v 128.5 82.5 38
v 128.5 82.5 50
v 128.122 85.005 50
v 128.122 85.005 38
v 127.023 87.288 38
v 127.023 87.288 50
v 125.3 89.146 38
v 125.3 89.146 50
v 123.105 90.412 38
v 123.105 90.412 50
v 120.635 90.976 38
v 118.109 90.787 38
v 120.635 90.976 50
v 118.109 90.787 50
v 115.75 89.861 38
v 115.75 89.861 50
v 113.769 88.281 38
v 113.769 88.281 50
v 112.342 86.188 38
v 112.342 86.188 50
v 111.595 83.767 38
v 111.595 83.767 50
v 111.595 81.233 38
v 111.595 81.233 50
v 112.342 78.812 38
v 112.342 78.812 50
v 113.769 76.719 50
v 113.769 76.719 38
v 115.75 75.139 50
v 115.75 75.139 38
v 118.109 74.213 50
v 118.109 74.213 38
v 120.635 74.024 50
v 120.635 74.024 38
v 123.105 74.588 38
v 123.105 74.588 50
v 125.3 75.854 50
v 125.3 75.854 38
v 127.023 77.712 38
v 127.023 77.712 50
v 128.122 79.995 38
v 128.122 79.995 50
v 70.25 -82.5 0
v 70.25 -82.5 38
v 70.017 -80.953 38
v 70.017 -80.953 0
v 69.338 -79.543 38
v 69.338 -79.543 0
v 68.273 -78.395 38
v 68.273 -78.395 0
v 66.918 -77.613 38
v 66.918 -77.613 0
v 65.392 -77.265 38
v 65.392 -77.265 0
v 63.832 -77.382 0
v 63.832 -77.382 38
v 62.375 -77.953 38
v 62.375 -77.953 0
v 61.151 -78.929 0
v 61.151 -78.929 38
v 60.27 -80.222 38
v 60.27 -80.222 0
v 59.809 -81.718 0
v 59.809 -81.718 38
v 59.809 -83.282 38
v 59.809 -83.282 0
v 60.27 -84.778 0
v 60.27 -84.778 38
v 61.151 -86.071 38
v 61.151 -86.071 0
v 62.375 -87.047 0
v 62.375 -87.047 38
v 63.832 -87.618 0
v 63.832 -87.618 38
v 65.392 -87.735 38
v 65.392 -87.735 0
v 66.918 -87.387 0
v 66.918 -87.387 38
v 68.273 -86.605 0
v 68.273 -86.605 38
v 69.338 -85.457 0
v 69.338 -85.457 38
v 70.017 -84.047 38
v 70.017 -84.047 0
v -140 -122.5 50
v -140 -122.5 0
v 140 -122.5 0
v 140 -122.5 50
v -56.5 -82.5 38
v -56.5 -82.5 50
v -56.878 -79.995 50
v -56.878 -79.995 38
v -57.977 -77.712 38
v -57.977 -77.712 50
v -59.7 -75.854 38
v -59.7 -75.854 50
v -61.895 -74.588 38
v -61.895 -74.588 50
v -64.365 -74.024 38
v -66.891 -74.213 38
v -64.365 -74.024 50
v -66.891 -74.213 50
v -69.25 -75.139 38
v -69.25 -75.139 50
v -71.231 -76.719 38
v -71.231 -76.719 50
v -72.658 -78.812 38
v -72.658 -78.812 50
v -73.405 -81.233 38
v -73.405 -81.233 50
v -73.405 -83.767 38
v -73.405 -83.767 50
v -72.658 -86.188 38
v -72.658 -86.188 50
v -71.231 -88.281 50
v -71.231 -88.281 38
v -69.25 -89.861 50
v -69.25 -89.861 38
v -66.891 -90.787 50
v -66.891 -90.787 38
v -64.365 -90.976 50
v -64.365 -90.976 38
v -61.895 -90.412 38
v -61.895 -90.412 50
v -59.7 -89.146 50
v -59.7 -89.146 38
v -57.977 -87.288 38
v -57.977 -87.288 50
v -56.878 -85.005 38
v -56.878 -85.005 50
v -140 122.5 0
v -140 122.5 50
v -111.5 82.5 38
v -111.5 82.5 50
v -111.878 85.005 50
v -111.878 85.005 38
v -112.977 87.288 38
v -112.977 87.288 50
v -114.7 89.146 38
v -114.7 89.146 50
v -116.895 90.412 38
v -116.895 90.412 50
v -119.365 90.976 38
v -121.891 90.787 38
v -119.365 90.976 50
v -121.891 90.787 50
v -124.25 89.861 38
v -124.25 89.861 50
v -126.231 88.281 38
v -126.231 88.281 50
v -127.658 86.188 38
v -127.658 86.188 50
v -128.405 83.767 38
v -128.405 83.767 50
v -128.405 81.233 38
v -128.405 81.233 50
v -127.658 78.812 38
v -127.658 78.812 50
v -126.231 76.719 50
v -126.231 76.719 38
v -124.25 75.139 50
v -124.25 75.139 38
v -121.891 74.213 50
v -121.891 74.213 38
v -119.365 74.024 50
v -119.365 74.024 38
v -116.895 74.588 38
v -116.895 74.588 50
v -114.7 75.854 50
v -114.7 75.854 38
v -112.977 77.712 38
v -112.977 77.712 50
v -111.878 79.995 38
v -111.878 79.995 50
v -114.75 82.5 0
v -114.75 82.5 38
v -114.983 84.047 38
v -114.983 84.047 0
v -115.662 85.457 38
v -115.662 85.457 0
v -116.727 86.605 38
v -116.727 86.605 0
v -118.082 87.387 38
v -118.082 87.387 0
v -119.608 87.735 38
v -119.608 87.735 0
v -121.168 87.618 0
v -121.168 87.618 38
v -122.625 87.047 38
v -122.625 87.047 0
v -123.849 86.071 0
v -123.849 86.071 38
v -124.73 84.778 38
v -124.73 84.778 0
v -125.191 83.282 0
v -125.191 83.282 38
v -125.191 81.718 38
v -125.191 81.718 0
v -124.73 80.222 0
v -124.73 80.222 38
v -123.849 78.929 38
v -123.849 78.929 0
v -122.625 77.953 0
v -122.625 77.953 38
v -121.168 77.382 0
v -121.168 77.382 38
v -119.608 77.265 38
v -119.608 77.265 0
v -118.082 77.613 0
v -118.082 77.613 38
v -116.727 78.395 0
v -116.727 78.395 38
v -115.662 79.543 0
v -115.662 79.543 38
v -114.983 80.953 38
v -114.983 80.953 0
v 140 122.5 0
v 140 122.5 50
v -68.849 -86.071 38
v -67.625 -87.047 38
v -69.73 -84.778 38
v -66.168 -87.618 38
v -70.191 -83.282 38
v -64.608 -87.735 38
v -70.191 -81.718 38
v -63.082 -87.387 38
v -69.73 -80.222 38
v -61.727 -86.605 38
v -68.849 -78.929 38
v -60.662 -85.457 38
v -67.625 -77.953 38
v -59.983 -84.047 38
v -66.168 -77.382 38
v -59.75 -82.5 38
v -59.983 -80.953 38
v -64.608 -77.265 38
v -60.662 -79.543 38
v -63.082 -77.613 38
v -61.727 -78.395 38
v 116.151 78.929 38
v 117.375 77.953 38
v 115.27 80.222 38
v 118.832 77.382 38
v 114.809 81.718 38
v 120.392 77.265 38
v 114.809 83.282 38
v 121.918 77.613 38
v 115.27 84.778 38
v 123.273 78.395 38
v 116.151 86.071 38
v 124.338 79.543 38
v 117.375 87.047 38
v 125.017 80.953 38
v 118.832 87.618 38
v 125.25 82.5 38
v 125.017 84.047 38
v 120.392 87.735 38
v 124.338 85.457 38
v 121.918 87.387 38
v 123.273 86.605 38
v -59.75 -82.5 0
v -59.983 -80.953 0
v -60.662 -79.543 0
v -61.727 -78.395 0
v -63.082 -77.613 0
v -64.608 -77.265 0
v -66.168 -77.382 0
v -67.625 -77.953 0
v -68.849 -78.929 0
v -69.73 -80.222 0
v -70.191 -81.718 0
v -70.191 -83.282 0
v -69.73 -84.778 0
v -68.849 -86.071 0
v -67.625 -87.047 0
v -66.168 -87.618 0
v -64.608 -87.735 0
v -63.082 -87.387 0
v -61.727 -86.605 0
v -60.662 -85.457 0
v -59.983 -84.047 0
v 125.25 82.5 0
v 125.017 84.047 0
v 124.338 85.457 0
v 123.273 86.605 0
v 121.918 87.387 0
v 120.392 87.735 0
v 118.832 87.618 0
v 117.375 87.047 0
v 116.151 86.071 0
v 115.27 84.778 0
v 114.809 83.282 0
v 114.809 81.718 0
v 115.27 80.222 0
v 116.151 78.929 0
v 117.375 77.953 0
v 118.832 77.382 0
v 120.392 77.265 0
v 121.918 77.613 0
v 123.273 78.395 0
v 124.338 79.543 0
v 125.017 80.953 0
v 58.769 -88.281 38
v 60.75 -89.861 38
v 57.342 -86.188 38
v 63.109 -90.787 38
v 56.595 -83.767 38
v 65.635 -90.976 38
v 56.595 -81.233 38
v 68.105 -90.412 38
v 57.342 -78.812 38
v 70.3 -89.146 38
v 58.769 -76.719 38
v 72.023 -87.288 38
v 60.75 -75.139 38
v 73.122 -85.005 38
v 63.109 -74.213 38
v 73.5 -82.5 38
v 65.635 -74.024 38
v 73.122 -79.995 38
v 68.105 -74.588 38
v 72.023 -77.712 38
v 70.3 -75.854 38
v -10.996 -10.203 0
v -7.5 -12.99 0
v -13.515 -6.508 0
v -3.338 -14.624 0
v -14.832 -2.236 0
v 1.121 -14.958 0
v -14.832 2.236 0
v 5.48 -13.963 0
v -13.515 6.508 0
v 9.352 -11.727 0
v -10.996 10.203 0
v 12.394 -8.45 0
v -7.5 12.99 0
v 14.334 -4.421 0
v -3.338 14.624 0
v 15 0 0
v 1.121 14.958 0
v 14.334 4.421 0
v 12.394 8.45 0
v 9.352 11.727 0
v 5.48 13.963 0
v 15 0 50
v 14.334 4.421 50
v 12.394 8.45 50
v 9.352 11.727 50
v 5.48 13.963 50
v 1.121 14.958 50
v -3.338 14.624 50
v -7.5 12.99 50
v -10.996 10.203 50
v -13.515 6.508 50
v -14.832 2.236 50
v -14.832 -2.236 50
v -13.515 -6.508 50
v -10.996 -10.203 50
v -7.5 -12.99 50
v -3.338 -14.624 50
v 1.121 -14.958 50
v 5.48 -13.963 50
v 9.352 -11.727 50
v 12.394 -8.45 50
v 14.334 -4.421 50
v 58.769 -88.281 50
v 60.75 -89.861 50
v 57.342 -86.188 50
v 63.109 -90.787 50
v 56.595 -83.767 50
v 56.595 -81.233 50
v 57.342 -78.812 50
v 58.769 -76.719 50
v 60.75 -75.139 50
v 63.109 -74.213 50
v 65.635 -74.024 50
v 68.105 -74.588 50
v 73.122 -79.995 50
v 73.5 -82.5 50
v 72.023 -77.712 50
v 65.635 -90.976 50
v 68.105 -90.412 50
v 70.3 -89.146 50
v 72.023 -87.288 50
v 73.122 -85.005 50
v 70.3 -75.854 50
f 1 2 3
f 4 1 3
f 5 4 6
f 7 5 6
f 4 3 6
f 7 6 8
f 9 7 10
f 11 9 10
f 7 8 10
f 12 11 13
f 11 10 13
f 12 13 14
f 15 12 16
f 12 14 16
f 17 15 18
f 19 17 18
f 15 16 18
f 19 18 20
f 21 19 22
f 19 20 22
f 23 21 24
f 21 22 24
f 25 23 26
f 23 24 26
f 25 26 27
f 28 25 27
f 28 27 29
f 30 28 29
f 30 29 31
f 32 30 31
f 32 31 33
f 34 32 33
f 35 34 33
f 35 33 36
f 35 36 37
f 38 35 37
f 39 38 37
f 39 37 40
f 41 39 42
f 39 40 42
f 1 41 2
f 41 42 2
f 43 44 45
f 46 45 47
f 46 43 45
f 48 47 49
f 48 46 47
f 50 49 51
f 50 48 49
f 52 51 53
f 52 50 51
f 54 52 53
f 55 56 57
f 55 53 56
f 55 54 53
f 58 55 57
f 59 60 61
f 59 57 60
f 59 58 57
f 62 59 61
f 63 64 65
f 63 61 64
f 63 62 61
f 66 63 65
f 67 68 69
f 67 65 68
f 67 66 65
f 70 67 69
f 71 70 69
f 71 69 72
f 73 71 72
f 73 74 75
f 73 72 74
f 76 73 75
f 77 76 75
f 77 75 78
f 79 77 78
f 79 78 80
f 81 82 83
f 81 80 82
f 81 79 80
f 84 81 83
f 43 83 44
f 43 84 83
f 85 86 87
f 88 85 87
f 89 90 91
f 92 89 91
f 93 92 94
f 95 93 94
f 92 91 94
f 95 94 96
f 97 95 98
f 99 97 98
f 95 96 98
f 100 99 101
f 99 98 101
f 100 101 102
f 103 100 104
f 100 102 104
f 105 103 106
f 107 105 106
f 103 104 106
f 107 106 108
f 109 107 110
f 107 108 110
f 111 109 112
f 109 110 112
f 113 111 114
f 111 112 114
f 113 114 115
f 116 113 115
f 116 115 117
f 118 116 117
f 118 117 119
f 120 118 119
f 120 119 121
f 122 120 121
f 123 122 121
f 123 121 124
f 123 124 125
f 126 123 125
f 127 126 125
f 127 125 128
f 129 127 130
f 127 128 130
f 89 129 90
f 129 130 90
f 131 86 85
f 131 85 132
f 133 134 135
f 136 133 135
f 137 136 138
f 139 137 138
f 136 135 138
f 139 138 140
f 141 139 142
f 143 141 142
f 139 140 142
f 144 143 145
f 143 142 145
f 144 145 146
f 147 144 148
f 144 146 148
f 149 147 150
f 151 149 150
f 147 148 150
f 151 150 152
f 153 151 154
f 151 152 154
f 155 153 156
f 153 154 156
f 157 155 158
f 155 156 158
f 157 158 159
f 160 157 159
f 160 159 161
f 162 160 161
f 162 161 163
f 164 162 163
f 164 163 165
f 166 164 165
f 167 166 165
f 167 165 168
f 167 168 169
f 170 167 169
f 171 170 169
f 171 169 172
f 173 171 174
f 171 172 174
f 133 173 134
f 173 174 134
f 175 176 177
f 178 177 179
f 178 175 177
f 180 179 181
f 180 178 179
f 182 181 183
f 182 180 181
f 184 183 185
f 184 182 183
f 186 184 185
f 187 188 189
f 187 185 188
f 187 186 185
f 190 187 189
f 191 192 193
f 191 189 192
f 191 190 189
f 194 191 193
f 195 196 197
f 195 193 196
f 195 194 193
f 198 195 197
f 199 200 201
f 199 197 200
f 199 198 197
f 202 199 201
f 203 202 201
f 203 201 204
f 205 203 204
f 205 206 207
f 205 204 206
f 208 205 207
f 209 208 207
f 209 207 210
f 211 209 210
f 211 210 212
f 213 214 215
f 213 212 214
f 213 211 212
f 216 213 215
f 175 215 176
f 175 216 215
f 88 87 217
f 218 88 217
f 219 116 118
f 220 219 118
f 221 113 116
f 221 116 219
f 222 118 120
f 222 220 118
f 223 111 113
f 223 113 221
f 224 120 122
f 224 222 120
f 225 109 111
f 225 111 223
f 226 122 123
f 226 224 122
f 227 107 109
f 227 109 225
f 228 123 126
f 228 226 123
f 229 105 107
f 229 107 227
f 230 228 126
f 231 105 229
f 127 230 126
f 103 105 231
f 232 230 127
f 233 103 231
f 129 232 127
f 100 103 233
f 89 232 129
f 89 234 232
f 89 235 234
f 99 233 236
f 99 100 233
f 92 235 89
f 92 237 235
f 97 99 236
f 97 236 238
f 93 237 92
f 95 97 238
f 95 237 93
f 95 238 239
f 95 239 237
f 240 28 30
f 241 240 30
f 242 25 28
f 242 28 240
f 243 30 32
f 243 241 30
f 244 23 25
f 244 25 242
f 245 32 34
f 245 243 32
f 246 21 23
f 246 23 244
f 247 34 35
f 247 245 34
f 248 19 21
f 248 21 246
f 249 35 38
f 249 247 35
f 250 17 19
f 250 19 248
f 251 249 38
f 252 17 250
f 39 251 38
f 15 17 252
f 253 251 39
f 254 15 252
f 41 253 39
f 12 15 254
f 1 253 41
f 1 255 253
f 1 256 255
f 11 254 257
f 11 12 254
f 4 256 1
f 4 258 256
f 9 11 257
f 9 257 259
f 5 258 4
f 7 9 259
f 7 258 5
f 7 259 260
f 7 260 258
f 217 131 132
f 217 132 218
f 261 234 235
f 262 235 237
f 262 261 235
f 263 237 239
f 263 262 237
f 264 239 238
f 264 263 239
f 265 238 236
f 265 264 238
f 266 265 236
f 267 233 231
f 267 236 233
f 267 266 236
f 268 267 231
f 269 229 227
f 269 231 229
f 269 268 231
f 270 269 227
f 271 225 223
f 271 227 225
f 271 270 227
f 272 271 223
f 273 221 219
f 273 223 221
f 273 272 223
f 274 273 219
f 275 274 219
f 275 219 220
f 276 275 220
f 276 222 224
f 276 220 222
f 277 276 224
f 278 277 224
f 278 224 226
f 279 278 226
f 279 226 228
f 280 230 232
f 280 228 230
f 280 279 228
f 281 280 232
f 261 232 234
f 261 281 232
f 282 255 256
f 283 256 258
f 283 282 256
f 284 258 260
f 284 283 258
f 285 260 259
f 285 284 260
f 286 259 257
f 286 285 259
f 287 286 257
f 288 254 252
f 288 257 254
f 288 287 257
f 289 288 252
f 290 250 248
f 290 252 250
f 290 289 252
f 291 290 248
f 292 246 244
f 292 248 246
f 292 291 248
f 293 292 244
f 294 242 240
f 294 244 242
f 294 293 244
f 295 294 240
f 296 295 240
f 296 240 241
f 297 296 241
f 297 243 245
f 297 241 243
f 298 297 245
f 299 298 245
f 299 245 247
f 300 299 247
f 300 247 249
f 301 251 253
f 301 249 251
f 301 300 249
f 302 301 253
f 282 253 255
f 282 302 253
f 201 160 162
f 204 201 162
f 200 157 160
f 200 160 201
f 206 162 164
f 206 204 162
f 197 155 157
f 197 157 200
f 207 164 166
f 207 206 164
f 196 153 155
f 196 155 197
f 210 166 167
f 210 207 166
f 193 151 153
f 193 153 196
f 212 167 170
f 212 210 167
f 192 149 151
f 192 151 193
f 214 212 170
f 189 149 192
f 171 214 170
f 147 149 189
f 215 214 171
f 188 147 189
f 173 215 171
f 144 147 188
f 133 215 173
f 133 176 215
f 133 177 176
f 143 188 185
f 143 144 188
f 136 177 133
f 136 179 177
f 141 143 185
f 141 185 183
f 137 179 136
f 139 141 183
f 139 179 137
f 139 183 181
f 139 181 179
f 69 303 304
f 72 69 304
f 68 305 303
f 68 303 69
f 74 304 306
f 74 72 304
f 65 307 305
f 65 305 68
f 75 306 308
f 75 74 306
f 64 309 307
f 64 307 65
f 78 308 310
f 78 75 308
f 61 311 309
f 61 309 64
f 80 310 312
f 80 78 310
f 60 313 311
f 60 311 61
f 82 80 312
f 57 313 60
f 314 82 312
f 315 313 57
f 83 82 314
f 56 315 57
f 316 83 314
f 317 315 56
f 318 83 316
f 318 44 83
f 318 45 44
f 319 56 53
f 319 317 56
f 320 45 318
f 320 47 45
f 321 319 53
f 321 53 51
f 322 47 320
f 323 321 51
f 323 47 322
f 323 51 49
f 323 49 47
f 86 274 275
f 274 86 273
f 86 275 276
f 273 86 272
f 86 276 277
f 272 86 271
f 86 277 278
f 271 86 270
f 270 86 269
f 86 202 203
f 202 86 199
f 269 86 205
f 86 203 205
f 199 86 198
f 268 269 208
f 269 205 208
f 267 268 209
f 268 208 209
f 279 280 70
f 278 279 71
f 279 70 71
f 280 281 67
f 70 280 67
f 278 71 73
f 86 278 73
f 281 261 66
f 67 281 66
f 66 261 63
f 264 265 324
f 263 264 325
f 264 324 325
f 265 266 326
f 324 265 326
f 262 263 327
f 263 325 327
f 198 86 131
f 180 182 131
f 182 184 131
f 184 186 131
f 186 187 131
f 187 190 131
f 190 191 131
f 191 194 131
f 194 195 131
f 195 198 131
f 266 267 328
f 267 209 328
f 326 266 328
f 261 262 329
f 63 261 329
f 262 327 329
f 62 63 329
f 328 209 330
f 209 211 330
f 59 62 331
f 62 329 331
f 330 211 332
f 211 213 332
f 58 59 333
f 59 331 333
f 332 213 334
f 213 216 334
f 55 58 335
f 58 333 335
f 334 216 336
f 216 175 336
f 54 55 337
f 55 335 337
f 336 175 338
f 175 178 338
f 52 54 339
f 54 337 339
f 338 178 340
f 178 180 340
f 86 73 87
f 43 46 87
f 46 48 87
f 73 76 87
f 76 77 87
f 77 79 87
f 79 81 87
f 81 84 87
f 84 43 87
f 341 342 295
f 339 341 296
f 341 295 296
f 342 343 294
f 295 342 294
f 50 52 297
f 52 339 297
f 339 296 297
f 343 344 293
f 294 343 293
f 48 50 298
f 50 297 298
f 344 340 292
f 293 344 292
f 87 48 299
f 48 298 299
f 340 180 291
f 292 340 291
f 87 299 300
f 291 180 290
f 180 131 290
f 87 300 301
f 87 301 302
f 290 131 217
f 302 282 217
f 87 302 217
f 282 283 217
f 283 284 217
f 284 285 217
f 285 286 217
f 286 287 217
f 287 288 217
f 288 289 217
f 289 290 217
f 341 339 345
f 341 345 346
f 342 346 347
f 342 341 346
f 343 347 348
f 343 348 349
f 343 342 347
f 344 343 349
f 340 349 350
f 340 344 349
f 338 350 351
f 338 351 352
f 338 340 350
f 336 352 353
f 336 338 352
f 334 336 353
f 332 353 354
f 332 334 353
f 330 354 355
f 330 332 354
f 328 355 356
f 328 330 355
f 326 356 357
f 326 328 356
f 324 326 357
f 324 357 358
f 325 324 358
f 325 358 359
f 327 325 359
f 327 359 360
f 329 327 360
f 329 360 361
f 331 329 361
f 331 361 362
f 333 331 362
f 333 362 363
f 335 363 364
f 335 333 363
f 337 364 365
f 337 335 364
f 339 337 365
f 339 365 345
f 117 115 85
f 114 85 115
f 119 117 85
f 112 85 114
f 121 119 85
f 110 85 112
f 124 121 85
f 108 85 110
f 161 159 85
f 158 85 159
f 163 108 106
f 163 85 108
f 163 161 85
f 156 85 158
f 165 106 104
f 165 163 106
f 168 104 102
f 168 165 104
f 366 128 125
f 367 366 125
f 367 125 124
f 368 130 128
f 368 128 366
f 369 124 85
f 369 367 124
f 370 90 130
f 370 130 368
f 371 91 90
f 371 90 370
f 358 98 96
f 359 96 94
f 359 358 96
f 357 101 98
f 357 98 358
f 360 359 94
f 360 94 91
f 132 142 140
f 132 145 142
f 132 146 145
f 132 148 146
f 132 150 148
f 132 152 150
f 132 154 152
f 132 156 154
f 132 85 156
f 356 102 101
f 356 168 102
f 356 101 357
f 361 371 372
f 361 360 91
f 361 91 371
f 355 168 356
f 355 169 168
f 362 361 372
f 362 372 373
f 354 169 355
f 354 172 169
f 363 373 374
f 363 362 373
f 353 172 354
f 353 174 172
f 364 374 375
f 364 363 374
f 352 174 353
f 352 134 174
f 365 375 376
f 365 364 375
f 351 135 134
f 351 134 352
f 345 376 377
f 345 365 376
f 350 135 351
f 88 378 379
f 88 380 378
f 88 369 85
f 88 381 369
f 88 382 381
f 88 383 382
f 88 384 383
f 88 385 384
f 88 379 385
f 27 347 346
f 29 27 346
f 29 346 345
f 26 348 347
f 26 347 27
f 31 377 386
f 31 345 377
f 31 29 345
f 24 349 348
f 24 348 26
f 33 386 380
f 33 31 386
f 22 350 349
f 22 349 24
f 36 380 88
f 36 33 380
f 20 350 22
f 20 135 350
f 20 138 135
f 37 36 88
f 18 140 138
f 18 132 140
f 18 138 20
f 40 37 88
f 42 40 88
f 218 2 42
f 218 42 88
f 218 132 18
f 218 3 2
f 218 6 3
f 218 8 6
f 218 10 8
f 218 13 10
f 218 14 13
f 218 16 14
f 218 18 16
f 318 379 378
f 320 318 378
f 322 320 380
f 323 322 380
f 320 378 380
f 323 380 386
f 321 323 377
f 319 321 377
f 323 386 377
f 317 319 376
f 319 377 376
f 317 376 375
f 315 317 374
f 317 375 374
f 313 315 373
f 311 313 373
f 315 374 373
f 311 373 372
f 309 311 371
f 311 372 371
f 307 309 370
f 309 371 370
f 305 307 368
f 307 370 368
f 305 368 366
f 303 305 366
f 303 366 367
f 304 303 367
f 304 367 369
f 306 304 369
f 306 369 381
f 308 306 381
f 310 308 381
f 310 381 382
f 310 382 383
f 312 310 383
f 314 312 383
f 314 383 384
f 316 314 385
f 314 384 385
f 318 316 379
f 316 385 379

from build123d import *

# Parameters (mm, degrees)
SKETCH1_W           = 280
SKETCH1_H           = 245
SKETCH1_R           = 15
SKETCH1_R_2         = 5.25
BOSS_EXTRUDE1_DEPTH = 50
SKETCH2_R           = 8.5
CUT_EXTRUDE1_DEPTH  = 12


with BuildPart() as part:
    # Sketch1 → Boss-Extrude1 (new body)
    with BuildSketch(Plane.XY):
        Rectangle(SKETCH1_W, SKETCH1_H)
        Circle(SKETCH1_R, mode=Mode.SUBTRACT)
        with Locations((-120, 82.5)):
            Circle(SKETCH1_R_2, mode=Mode.SUBTRACT)
        with Locations((120, 82.5)):
            Circle(SKETCH1_R_2, mode=Mode.SUBTRACT)
        with Locations((-65, -82.5)):
            Circle(SKETCH1_R_2, mode=Mode.SUBTRACT)
        with Locations((65, -82.5)):
            Circle(SKETCH1_R_2, mode=Mode.SUBTRACT)
    extrude(amount=BOSS_EXTRUDE1_DEPTH)

    # Sketch2 → Cut-Extrude1 (cut)
    with BuildSketch(Plane.XY.offset(50)):
        with Locations((-120, 82.5)):
            Circle(SKETCH2_R)
        with Locations((120, 82.5)):
            Circle(SKETCH2_R)
        with Locations((65, -82.5)):
            Circle(SKETCH2_R)
        with Locations((-65, -82.5)):
            Circle(SKETCH2_R)
    extrude(amount=-CUT_EXTRUDE1_DEPTH, mode=Mode.SUBTRACT)


solid = part.part
